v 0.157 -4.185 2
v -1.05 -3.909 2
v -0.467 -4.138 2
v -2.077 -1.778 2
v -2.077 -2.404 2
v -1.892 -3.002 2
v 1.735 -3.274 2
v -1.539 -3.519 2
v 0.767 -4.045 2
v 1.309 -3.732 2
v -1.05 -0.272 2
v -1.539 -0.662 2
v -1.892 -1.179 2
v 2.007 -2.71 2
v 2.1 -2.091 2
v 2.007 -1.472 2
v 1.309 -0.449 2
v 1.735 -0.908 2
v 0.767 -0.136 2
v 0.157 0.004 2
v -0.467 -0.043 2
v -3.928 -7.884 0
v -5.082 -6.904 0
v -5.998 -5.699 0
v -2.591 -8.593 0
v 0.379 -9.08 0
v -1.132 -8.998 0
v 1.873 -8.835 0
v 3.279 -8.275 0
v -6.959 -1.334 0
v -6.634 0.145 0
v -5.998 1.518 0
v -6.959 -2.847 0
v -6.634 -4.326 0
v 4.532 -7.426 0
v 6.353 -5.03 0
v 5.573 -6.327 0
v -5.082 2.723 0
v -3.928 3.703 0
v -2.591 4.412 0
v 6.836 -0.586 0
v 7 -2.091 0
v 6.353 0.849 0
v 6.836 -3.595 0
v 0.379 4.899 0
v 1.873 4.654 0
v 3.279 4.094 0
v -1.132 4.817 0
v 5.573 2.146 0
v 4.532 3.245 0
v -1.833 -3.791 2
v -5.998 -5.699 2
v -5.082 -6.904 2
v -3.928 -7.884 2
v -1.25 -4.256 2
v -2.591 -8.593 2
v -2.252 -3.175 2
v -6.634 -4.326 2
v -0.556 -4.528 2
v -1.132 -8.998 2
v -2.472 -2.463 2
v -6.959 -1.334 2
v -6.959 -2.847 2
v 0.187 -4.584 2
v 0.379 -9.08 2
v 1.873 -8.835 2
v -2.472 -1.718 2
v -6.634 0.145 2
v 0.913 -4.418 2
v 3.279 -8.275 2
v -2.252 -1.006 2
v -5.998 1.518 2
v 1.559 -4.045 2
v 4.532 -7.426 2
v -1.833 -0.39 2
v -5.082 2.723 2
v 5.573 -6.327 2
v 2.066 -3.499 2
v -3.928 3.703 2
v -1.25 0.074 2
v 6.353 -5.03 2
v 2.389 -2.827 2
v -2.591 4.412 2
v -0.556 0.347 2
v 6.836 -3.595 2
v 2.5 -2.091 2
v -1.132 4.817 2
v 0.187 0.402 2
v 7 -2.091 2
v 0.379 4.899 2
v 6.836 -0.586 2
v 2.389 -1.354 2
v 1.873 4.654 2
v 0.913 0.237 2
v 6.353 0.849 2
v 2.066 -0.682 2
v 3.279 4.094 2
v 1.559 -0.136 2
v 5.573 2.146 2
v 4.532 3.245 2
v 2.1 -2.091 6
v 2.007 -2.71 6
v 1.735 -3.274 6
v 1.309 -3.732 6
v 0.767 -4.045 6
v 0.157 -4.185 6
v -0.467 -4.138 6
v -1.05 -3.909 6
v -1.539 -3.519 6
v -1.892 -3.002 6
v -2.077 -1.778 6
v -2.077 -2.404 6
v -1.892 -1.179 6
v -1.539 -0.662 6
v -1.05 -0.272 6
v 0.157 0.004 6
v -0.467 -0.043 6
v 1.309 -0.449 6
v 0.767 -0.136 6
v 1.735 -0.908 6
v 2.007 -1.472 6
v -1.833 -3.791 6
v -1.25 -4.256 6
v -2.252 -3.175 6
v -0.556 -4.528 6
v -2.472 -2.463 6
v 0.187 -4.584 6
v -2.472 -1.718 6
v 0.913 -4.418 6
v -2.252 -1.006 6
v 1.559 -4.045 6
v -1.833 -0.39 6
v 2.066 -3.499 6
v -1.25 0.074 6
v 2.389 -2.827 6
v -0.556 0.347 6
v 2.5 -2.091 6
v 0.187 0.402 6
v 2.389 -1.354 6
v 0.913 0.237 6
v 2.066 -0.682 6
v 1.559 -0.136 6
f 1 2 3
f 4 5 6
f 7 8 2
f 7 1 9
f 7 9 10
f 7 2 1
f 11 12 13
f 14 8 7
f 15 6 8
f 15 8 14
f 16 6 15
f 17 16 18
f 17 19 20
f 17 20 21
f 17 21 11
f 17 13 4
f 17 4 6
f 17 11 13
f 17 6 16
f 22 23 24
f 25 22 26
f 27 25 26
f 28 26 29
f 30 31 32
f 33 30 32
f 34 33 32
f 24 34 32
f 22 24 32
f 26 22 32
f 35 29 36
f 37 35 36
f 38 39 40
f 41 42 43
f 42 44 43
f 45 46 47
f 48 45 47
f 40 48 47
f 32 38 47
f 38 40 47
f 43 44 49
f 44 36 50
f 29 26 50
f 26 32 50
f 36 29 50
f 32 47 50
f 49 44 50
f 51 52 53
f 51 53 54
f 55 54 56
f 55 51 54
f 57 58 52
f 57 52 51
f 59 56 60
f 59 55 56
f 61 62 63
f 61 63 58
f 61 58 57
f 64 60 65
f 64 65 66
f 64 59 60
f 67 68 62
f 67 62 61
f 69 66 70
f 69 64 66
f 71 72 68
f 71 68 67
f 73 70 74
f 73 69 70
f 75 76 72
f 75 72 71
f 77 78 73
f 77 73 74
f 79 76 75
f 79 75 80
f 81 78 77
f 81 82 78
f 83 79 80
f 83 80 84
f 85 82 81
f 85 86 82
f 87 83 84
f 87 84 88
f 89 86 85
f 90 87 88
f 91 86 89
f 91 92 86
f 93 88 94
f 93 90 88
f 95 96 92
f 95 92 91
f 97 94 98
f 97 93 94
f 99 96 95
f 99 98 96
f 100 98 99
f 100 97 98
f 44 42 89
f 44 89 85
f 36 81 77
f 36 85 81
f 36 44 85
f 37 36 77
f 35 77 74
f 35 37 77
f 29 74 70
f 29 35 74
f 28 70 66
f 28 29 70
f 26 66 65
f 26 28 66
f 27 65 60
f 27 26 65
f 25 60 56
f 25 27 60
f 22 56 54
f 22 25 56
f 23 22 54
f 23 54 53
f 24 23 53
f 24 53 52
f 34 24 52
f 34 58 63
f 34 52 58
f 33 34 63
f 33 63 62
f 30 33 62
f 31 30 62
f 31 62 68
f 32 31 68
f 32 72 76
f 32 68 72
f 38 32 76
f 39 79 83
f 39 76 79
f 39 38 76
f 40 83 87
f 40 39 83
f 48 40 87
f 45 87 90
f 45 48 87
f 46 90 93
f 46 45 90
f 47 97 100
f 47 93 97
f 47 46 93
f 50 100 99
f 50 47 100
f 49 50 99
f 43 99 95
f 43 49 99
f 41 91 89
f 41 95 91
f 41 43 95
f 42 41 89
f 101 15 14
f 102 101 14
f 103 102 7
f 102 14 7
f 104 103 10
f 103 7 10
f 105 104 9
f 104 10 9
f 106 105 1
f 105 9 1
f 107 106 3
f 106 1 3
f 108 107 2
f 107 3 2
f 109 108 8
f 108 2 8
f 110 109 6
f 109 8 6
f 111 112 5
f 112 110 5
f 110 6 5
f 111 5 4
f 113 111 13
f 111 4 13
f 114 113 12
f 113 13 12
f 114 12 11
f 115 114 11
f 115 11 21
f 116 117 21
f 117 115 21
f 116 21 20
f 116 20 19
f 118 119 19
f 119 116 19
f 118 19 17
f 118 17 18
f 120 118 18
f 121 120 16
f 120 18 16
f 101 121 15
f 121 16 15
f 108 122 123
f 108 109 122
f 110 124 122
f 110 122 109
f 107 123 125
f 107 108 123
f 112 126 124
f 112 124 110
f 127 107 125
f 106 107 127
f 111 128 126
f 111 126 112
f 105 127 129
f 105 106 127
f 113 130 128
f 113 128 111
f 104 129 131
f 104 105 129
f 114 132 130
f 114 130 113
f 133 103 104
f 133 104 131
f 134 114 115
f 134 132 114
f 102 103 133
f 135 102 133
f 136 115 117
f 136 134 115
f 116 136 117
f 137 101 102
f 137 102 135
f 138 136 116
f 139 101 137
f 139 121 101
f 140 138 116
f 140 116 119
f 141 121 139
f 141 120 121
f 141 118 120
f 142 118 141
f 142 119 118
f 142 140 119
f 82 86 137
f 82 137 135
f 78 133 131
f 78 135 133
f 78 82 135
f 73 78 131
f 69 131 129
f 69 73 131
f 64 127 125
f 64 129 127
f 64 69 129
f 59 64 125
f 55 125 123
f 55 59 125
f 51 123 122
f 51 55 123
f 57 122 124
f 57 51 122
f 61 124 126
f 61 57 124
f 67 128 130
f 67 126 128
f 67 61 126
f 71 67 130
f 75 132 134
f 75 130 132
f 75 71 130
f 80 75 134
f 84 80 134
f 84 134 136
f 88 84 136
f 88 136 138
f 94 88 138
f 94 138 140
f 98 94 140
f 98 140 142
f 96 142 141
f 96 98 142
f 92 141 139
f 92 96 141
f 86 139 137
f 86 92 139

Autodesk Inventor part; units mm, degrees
ref_plane "YZ Plane" through (0, 0, 0) normal (1, 0, 0) x (0, 1, 0)
ref_plane "XZ Plane" through (0, 0, 0) normal (0, 1, 0) x (-1, 0, 0)
ref_plane "XY Plane" through (0, 0, 0) normal (0, 0, 1) x (1, 0, 0)
sketch "Esquisse1" plane through (0, 0, 0) normal (0, 0, 1) x (1, 0, 0)
  circle A0 centre (0, -2.0906) radius 7
  point P0 (0, 0)
  dimension "d0" = 14
extrude "Extrusion1" add sketch "Esquisse1" along normal blind 2
sketch "Esquisse2" plane through (0, -2.0906, 2) normal (0, 0, 1) x (1, 0, 0)
  circle A0 centre (0, 0) radius 2.1
  circle A1 centre (0, 0) radius 2.5
  point P0 (0, 2.0906)
  dimension "d3" = 4.2
  dimension "d4" = 5
extrude "Extrusion2" add sketch "Esquisse2" along normal blind 4
properties part number "ajust_plaque"
